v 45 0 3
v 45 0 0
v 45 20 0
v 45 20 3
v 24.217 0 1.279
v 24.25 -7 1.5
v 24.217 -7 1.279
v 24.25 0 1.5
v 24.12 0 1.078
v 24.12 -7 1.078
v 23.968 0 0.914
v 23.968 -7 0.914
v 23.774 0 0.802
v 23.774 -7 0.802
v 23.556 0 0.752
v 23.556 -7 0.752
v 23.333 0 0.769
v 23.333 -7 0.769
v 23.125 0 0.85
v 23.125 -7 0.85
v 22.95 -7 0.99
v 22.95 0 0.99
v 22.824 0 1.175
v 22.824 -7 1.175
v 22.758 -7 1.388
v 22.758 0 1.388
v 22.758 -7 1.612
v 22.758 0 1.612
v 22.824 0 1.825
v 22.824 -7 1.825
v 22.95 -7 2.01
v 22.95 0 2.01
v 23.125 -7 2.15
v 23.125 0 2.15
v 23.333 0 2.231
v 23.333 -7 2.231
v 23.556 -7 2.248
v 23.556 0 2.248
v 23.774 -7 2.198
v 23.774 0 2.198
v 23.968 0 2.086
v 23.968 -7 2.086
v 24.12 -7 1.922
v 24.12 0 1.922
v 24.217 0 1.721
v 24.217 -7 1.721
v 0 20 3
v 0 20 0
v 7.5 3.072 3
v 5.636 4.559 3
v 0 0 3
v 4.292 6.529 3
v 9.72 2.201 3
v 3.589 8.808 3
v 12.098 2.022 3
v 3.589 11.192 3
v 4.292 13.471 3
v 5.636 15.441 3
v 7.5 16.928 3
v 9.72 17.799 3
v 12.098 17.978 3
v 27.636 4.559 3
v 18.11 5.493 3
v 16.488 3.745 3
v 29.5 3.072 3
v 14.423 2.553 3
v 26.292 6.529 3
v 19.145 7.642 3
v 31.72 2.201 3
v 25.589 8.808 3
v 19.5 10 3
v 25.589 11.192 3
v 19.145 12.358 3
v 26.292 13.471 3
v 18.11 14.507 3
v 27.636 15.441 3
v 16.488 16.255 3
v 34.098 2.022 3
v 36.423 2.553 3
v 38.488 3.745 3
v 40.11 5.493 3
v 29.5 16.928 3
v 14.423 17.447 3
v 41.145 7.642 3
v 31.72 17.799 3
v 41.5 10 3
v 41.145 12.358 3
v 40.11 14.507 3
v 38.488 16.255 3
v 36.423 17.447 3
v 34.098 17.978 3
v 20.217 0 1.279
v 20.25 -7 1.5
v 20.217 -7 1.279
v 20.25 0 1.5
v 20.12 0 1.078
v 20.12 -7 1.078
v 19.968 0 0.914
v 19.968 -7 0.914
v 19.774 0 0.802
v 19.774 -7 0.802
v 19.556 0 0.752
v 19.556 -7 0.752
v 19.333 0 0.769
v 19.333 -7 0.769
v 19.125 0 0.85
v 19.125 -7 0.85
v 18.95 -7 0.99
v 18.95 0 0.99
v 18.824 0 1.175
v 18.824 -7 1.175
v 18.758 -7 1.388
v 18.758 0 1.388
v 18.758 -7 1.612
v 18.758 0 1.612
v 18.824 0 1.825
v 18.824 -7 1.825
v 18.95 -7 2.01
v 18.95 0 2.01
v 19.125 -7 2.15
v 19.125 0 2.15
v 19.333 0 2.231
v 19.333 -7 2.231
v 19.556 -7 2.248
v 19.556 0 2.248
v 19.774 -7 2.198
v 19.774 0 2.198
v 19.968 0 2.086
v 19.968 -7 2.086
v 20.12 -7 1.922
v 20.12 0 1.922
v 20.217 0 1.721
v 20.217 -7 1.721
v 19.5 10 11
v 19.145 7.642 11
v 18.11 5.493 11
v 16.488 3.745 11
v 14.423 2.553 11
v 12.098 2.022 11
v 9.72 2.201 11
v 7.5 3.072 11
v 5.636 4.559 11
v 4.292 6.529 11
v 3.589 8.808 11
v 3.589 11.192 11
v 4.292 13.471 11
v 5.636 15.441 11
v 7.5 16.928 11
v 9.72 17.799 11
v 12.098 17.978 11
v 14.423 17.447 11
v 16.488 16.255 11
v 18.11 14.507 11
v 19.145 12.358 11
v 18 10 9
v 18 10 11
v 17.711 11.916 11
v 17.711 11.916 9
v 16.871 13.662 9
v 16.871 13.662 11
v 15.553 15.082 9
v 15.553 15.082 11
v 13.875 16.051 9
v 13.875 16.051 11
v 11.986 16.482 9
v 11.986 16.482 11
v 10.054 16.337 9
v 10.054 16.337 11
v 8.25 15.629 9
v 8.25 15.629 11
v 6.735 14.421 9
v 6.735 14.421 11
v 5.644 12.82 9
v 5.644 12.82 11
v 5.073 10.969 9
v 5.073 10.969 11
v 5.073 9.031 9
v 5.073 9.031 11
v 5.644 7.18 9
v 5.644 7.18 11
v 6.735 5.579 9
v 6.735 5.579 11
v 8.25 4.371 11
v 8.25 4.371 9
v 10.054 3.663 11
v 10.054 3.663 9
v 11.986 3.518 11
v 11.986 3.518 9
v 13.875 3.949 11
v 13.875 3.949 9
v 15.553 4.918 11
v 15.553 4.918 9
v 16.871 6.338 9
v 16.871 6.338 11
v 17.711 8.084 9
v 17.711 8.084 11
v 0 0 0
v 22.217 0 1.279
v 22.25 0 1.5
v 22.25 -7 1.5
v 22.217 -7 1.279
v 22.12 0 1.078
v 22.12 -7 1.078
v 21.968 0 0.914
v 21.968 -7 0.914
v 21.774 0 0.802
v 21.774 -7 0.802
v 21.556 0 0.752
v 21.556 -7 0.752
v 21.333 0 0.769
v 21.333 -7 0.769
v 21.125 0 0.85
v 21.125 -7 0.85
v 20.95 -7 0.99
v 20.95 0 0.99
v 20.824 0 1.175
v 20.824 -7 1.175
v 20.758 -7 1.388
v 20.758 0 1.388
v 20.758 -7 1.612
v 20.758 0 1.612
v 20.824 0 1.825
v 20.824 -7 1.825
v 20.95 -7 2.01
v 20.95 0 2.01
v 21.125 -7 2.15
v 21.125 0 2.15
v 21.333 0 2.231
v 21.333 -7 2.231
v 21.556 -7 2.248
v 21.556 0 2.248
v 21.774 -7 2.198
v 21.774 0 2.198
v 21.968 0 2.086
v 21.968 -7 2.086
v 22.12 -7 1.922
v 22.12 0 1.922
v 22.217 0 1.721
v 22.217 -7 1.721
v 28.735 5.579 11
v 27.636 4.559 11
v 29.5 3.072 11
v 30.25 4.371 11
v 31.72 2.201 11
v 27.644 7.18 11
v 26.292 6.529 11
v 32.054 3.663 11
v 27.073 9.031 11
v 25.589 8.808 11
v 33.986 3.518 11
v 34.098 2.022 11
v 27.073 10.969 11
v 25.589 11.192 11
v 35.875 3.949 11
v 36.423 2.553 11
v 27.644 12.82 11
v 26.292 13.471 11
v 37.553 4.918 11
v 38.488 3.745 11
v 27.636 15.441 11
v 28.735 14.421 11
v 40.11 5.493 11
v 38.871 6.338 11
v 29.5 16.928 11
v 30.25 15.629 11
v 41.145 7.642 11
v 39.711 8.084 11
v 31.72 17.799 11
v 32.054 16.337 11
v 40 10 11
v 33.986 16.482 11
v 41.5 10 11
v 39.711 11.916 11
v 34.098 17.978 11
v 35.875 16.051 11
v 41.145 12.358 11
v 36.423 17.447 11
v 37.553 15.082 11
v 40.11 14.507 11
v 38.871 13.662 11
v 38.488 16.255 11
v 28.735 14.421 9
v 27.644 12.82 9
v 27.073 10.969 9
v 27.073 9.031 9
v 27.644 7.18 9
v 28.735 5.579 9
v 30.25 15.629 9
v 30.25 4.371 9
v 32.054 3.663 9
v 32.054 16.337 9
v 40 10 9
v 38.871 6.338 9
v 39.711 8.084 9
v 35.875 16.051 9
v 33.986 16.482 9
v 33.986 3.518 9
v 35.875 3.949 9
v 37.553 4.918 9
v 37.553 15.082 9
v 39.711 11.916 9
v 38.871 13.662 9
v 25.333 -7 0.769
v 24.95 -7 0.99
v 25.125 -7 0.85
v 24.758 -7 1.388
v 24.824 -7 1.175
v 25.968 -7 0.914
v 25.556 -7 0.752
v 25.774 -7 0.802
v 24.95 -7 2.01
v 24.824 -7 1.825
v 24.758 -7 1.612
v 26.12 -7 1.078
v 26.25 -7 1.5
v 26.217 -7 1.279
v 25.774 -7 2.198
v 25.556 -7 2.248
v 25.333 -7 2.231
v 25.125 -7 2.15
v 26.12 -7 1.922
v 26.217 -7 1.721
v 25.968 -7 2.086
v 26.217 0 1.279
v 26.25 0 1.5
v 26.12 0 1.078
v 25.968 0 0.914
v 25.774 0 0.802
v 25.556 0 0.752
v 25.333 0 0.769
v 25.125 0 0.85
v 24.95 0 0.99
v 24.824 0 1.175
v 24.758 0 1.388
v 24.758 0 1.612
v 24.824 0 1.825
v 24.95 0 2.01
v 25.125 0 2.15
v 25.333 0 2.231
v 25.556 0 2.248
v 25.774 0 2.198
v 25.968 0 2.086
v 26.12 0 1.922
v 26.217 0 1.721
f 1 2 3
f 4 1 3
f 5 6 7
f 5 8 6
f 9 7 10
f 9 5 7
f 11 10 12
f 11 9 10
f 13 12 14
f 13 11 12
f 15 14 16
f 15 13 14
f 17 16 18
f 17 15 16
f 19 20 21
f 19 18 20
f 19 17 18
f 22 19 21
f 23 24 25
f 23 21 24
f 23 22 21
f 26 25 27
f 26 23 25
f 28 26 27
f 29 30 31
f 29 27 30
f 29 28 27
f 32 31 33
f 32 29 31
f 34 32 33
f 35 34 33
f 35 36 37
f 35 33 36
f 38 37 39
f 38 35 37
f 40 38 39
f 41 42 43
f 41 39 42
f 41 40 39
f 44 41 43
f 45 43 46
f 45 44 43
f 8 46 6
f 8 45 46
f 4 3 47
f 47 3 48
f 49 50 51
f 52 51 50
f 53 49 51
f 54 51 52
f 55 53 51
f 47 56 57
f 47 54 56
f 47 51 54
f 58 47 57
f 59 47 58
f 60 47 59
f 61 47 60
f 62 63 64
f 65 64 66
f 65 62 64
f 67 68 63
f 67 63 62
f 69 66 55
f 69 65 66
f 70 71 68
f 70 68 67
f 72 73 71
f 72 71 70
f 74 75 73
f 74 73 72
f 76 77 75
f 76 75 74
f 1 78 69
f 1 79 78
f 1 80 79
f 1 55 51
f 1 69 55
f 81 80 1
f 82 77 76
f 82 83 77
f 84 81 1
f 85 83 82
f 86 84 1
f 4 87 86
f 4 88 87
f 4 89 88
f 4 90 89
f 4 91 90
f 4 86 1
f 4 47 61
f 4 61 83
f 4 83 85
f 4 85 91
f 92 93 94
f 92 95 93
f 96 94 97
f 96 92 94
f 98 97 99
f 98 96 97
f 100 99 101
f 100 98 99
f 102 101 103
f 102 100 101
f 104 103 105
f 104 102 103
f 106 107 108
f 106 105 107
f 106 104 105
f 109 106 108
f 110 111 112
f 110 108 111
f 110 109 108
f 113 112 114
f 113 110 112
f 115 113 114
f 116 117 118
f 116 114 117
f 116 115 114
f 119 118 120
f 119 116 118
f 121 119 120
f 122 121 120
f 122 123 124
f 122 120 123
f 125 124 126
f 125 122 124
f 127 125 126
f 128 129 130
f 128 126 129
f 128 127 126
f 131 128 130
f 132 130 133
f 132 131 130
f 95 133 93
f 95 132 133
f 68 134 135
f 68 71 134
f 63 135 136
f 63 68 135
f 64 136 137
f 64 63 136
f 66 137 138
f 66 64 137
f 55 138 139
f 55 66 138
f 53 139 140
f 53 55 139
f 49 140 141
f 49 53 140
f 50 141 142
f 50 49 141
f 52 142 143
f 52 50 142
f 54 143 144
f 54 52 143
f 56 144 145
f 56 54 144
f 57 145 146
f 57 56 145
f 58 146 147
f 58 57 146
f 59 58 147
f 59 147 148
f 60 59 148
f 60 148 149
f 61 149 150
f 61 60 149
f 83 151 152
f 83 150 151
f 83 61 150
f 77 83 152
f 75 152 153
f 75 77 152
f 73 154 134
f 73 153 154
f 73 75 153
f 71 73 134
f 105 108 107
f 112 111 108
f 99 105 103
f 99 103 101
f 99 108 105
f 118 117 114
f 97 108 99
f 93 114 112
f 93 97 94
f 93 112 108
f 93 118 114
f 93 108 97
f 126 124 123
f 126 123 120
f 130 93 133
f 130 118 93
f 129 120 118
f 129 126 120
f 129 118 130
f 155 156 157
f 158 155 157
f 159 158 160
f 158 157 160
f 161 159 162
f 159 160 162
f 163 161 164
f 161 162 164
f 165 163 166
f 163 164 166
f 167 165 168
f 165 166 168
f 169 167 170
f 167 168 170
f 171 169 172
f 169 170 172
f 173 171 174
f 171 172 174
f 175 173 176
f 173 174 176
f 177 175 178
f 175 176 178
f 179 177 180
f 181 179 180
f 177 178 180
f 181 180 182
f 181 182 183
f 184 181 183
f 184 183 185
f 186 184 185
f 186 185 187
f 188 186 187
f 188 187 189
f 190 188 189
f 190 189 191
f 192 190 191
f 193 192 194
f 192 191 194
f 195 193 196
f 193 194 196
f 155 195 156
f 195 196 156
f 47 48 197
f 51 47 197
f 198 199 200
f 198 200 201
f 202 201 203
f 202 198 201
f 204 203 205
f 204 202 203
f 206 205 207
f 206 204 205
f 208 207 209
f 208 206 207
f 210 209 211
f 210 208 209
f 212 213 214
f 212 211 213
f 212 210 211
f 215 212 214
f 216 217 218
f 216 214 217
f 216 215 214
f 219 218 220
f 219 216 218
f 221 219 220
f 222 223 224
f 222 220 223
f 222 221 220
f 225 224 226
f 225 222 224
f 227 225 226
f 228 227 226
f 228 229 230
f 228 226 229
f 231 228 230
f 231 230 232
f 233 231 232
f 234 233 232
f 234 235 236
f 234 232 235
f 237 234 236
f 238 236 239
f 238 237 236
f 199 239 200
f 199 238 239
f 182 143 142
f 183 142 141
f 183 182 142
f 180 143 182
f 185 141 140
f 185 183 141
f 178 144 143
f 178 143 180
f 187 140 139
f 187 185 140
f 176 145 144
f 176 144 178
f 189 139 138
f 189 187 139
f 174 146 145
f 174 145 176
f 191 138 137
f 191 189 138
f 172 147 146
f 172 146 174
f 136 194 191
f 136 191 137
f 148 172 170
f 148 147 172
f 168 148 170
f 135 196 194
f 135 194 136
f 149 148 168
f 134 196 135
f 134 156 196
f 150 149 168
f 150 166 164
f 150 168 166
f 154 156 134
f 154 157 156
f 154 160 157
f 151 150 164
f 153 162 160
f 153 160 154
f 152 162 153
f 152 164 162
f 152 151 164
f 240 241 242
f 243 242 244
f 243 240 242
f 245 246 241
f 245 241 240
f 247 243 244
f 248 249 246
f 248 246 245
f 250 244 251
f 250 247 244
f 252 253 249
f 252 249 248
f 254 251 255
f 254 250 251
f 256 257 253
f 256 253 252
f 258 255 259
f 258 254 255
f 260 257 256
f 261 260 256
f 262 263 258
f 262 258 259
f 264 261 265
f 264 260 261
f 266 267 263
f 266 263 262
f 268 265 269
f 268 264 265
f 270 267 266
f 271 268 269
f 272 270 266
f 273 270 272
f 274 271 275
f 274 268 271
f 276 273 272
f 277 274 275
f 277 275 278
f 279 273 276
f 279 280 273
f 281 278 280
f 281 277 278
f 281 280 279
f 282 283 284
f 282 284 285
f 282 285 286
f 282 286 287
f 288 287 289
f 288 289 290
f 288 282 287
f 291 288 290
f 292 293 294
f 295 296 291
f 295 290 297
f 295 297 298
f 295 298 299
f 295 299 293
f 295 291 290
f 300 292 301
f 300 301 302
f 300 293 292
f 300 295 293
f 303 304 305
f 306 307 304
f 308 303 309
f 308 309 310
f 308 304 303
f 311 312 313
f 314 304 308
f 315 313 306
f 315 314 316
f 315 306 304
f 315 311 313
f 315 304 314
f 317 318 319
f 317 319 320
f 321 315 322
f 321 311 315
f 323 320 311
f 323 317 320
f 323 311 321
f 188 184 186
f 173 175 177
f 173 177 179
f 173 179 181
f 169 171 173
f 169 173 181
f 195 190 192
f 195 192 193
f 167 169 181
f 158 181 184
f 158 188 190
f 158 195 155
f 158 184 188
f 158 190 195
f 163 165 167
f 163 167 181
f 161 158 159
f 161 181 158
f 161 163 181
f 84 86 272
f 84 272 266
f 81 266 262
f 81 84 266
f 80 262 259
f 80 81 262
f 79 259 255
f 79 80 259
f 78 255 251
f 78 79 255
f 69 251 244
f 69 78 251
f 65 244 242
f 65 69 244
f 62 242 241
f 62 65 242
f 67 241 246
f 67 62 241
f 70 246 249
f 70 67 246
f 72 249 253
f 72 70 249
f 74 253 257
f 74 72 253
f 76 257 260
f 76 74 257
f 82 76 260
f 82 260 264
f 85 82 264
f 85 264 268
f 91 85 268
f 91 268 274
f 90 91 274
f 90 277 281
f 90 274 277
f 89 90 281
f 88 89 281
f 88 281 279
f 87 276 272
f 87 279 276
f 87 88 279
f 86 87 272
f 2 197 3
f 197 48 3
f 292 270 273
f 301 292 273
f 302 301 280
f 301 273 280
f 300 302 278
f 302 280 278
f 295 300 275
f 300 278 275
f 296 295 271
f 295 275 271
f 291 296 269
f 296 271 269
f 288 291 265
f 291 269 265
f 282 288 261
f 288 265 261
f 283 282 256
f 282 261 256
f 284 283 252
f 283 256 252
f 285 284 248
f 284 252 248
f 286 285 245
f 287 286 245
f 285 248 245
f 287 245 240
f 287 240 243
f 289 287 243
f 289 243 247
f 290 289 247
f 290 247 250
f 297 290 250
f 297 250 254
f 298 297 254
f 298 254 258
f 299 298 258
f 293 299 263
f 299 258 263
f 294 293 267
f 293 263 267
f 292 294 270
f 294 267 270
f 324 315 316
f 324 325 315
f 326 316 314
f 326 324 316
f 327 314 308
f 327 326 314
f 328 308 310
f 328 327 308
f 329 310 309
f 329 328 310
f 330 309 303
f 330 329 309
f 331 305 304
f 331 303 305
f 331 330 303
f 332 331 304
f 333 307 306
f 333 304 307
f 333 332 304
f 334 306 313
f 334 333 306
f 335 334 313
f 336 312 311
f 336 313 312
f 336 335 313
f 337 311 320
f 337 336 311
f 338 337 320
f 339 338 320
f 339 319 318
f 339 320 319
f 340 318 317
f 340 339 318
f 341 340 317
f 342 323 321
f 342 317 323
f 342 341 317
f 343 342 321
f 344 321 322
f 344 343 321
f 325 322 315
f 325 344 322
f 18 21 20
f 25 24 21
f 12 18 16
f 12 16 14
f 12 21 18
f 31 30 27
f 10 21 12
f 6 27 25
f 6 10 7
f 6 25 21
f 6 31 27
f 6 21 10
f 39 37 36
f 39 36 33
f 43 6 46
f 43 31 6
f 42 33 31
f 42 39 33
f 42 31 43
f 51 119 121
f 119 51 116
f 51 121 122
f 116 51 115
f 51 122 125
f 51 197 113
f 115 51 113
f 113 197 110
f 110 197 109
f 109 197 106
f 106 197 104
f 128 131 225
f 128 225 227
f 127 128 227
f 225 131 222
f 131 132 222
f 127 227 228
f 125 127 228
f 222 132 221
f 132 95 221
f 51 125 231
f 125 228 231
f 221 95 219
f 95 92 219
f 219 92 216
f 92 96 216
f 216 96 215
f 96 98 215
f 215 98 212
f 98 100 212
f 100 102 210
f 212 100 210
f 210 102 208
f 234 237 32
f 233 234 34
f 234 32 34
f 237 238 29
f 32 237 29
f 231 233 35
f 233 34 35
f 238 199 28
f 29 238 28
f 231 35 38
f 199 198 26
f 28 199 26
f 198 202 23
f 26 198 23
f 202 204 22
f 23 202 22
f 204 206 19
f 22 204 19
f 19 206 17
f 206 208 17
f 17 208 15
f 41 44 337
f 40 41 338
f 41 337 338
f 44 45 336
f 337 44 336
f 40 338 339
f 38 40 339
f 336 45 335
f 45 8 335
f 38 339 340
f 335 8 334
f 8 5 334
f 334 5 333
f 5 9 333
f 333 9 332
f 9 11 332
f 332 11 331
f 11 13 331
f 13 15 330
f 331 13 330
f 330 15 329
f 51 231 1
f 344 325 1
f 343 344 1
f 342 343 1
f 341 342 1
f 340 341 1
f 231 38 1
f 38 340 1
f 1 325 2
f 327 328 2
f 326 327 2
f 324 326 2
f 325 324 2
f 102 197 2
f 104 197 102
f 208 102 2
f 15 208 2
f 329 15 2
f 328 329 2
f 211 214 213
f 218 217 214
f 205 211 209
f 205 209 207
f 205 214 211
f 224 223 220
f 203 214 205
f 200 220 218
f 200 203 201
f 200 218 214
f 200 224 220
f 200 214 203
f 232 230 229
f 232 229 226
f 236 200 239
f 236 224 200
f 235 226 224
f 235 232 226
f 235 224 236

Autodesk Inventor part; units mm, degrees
ref_plane "YZ Plane" through (0, 0, 0) normal (1, 0, 0) x (0, 1, 0)
ref_plane "XZ Plane" through (0, 0, 0) normal (0, 1, 0) x (-1, 0, 0)
ref_plane "XY Plane" through (0, 0, 0) normal (0, 0, 1) x (1, 0, 0)
sketch "Esquisse1" plane through (0, 0, 0) normal (0, 0, 1) x (1, 0, 0)
  line L0 (0, 0) -> (45, 0)
  line L1 (45, 0) -> (45, 20)
  line L2 (45, 20) -> (0, 20)
  line L3 (0, 20) -> (0, 0)
  dimension "d0" = 45
  dimension "d1" = 20
extrude "Extrusion1" add sketch "Esquisse1" along normal blind 3
sketch "Esquisse2" plane through (0, 0, 3) normal (0, 0, 1) x (1, 0, 0)
  line L0 (45, 0) -> (45, 20) projected
  line L1 (0, 0) -> (45, 0) projected
  circle A0 centre (11.5, 10) radius 8
  circle A1 centre (33.5, 10) radius 8
  dimension "d4" = 22
  dimension "d5" = 11.5
  dimension "d6" = 10
  dimension "d7" = 10
  dimension "d8" = 16
  dimension "d9" = 16
extrude "Extrusion2" add sketch "Esquisse2" along normal blind 8
sketch "Esquisse3" plane through (11.5, 10, 11) normal (0, 0, 1) x (1, 0, 0)
  circle A0 centre (0, 0) radius 6.5
  circle A1 centre (22, 0) radius 8 projected
  circle A2 centre (22, 0) radius 6.5
  circle A3 centre (0, 0) radius 7.9442
  circle A4 centre (22, 0) radius 8
  point P0 (-11.5, -10)
  dimension "d12" = 13
  dimension "d13" = 13
extrude "Extrusion3" cut sketch "Esquisse3" against normal blind 2 contours A0 | A2
sketch "Esquisse4" plane through (0, 0, 0) normal (0, -1, 0) x (1, 0, 0)
  line L0 (45, 0) -> (45, 3) projected
  circle A0 centre (19.5, 1.5) radius 0.75
  circle A1 centre (21.5, 1.5) radius 0.75
  circle A2 centre (23.5, 1.5) radius 0.75
  circle A3 centre (25.5, 1.5) radius 0.75
  line L1 (0, 3) -> (45, 3) projected
  point P0 (0, 0)
  dimension "d17" = 2
  dimension "d18" = 2
  dimension "d19" = 2
  dimension "d22" = 1.5
  dimension "d23" = 1.5
  dimension "d24" = 1.5
  dimension "d25" = 1.5
  dimension "d26" = 19.5
  dimension "d29" = 1.5
  dimension "d30" = 3
extrude "Extrusion4" add sketch "Esquisse4" along normal blind 7
equation "\"d7\" = d6"
equation "\"d18\" = d17"
equation "\"d19\" = d17"
equation "\"d29\" = 0.5 * d30"
properties part number "US HC-SR04"
